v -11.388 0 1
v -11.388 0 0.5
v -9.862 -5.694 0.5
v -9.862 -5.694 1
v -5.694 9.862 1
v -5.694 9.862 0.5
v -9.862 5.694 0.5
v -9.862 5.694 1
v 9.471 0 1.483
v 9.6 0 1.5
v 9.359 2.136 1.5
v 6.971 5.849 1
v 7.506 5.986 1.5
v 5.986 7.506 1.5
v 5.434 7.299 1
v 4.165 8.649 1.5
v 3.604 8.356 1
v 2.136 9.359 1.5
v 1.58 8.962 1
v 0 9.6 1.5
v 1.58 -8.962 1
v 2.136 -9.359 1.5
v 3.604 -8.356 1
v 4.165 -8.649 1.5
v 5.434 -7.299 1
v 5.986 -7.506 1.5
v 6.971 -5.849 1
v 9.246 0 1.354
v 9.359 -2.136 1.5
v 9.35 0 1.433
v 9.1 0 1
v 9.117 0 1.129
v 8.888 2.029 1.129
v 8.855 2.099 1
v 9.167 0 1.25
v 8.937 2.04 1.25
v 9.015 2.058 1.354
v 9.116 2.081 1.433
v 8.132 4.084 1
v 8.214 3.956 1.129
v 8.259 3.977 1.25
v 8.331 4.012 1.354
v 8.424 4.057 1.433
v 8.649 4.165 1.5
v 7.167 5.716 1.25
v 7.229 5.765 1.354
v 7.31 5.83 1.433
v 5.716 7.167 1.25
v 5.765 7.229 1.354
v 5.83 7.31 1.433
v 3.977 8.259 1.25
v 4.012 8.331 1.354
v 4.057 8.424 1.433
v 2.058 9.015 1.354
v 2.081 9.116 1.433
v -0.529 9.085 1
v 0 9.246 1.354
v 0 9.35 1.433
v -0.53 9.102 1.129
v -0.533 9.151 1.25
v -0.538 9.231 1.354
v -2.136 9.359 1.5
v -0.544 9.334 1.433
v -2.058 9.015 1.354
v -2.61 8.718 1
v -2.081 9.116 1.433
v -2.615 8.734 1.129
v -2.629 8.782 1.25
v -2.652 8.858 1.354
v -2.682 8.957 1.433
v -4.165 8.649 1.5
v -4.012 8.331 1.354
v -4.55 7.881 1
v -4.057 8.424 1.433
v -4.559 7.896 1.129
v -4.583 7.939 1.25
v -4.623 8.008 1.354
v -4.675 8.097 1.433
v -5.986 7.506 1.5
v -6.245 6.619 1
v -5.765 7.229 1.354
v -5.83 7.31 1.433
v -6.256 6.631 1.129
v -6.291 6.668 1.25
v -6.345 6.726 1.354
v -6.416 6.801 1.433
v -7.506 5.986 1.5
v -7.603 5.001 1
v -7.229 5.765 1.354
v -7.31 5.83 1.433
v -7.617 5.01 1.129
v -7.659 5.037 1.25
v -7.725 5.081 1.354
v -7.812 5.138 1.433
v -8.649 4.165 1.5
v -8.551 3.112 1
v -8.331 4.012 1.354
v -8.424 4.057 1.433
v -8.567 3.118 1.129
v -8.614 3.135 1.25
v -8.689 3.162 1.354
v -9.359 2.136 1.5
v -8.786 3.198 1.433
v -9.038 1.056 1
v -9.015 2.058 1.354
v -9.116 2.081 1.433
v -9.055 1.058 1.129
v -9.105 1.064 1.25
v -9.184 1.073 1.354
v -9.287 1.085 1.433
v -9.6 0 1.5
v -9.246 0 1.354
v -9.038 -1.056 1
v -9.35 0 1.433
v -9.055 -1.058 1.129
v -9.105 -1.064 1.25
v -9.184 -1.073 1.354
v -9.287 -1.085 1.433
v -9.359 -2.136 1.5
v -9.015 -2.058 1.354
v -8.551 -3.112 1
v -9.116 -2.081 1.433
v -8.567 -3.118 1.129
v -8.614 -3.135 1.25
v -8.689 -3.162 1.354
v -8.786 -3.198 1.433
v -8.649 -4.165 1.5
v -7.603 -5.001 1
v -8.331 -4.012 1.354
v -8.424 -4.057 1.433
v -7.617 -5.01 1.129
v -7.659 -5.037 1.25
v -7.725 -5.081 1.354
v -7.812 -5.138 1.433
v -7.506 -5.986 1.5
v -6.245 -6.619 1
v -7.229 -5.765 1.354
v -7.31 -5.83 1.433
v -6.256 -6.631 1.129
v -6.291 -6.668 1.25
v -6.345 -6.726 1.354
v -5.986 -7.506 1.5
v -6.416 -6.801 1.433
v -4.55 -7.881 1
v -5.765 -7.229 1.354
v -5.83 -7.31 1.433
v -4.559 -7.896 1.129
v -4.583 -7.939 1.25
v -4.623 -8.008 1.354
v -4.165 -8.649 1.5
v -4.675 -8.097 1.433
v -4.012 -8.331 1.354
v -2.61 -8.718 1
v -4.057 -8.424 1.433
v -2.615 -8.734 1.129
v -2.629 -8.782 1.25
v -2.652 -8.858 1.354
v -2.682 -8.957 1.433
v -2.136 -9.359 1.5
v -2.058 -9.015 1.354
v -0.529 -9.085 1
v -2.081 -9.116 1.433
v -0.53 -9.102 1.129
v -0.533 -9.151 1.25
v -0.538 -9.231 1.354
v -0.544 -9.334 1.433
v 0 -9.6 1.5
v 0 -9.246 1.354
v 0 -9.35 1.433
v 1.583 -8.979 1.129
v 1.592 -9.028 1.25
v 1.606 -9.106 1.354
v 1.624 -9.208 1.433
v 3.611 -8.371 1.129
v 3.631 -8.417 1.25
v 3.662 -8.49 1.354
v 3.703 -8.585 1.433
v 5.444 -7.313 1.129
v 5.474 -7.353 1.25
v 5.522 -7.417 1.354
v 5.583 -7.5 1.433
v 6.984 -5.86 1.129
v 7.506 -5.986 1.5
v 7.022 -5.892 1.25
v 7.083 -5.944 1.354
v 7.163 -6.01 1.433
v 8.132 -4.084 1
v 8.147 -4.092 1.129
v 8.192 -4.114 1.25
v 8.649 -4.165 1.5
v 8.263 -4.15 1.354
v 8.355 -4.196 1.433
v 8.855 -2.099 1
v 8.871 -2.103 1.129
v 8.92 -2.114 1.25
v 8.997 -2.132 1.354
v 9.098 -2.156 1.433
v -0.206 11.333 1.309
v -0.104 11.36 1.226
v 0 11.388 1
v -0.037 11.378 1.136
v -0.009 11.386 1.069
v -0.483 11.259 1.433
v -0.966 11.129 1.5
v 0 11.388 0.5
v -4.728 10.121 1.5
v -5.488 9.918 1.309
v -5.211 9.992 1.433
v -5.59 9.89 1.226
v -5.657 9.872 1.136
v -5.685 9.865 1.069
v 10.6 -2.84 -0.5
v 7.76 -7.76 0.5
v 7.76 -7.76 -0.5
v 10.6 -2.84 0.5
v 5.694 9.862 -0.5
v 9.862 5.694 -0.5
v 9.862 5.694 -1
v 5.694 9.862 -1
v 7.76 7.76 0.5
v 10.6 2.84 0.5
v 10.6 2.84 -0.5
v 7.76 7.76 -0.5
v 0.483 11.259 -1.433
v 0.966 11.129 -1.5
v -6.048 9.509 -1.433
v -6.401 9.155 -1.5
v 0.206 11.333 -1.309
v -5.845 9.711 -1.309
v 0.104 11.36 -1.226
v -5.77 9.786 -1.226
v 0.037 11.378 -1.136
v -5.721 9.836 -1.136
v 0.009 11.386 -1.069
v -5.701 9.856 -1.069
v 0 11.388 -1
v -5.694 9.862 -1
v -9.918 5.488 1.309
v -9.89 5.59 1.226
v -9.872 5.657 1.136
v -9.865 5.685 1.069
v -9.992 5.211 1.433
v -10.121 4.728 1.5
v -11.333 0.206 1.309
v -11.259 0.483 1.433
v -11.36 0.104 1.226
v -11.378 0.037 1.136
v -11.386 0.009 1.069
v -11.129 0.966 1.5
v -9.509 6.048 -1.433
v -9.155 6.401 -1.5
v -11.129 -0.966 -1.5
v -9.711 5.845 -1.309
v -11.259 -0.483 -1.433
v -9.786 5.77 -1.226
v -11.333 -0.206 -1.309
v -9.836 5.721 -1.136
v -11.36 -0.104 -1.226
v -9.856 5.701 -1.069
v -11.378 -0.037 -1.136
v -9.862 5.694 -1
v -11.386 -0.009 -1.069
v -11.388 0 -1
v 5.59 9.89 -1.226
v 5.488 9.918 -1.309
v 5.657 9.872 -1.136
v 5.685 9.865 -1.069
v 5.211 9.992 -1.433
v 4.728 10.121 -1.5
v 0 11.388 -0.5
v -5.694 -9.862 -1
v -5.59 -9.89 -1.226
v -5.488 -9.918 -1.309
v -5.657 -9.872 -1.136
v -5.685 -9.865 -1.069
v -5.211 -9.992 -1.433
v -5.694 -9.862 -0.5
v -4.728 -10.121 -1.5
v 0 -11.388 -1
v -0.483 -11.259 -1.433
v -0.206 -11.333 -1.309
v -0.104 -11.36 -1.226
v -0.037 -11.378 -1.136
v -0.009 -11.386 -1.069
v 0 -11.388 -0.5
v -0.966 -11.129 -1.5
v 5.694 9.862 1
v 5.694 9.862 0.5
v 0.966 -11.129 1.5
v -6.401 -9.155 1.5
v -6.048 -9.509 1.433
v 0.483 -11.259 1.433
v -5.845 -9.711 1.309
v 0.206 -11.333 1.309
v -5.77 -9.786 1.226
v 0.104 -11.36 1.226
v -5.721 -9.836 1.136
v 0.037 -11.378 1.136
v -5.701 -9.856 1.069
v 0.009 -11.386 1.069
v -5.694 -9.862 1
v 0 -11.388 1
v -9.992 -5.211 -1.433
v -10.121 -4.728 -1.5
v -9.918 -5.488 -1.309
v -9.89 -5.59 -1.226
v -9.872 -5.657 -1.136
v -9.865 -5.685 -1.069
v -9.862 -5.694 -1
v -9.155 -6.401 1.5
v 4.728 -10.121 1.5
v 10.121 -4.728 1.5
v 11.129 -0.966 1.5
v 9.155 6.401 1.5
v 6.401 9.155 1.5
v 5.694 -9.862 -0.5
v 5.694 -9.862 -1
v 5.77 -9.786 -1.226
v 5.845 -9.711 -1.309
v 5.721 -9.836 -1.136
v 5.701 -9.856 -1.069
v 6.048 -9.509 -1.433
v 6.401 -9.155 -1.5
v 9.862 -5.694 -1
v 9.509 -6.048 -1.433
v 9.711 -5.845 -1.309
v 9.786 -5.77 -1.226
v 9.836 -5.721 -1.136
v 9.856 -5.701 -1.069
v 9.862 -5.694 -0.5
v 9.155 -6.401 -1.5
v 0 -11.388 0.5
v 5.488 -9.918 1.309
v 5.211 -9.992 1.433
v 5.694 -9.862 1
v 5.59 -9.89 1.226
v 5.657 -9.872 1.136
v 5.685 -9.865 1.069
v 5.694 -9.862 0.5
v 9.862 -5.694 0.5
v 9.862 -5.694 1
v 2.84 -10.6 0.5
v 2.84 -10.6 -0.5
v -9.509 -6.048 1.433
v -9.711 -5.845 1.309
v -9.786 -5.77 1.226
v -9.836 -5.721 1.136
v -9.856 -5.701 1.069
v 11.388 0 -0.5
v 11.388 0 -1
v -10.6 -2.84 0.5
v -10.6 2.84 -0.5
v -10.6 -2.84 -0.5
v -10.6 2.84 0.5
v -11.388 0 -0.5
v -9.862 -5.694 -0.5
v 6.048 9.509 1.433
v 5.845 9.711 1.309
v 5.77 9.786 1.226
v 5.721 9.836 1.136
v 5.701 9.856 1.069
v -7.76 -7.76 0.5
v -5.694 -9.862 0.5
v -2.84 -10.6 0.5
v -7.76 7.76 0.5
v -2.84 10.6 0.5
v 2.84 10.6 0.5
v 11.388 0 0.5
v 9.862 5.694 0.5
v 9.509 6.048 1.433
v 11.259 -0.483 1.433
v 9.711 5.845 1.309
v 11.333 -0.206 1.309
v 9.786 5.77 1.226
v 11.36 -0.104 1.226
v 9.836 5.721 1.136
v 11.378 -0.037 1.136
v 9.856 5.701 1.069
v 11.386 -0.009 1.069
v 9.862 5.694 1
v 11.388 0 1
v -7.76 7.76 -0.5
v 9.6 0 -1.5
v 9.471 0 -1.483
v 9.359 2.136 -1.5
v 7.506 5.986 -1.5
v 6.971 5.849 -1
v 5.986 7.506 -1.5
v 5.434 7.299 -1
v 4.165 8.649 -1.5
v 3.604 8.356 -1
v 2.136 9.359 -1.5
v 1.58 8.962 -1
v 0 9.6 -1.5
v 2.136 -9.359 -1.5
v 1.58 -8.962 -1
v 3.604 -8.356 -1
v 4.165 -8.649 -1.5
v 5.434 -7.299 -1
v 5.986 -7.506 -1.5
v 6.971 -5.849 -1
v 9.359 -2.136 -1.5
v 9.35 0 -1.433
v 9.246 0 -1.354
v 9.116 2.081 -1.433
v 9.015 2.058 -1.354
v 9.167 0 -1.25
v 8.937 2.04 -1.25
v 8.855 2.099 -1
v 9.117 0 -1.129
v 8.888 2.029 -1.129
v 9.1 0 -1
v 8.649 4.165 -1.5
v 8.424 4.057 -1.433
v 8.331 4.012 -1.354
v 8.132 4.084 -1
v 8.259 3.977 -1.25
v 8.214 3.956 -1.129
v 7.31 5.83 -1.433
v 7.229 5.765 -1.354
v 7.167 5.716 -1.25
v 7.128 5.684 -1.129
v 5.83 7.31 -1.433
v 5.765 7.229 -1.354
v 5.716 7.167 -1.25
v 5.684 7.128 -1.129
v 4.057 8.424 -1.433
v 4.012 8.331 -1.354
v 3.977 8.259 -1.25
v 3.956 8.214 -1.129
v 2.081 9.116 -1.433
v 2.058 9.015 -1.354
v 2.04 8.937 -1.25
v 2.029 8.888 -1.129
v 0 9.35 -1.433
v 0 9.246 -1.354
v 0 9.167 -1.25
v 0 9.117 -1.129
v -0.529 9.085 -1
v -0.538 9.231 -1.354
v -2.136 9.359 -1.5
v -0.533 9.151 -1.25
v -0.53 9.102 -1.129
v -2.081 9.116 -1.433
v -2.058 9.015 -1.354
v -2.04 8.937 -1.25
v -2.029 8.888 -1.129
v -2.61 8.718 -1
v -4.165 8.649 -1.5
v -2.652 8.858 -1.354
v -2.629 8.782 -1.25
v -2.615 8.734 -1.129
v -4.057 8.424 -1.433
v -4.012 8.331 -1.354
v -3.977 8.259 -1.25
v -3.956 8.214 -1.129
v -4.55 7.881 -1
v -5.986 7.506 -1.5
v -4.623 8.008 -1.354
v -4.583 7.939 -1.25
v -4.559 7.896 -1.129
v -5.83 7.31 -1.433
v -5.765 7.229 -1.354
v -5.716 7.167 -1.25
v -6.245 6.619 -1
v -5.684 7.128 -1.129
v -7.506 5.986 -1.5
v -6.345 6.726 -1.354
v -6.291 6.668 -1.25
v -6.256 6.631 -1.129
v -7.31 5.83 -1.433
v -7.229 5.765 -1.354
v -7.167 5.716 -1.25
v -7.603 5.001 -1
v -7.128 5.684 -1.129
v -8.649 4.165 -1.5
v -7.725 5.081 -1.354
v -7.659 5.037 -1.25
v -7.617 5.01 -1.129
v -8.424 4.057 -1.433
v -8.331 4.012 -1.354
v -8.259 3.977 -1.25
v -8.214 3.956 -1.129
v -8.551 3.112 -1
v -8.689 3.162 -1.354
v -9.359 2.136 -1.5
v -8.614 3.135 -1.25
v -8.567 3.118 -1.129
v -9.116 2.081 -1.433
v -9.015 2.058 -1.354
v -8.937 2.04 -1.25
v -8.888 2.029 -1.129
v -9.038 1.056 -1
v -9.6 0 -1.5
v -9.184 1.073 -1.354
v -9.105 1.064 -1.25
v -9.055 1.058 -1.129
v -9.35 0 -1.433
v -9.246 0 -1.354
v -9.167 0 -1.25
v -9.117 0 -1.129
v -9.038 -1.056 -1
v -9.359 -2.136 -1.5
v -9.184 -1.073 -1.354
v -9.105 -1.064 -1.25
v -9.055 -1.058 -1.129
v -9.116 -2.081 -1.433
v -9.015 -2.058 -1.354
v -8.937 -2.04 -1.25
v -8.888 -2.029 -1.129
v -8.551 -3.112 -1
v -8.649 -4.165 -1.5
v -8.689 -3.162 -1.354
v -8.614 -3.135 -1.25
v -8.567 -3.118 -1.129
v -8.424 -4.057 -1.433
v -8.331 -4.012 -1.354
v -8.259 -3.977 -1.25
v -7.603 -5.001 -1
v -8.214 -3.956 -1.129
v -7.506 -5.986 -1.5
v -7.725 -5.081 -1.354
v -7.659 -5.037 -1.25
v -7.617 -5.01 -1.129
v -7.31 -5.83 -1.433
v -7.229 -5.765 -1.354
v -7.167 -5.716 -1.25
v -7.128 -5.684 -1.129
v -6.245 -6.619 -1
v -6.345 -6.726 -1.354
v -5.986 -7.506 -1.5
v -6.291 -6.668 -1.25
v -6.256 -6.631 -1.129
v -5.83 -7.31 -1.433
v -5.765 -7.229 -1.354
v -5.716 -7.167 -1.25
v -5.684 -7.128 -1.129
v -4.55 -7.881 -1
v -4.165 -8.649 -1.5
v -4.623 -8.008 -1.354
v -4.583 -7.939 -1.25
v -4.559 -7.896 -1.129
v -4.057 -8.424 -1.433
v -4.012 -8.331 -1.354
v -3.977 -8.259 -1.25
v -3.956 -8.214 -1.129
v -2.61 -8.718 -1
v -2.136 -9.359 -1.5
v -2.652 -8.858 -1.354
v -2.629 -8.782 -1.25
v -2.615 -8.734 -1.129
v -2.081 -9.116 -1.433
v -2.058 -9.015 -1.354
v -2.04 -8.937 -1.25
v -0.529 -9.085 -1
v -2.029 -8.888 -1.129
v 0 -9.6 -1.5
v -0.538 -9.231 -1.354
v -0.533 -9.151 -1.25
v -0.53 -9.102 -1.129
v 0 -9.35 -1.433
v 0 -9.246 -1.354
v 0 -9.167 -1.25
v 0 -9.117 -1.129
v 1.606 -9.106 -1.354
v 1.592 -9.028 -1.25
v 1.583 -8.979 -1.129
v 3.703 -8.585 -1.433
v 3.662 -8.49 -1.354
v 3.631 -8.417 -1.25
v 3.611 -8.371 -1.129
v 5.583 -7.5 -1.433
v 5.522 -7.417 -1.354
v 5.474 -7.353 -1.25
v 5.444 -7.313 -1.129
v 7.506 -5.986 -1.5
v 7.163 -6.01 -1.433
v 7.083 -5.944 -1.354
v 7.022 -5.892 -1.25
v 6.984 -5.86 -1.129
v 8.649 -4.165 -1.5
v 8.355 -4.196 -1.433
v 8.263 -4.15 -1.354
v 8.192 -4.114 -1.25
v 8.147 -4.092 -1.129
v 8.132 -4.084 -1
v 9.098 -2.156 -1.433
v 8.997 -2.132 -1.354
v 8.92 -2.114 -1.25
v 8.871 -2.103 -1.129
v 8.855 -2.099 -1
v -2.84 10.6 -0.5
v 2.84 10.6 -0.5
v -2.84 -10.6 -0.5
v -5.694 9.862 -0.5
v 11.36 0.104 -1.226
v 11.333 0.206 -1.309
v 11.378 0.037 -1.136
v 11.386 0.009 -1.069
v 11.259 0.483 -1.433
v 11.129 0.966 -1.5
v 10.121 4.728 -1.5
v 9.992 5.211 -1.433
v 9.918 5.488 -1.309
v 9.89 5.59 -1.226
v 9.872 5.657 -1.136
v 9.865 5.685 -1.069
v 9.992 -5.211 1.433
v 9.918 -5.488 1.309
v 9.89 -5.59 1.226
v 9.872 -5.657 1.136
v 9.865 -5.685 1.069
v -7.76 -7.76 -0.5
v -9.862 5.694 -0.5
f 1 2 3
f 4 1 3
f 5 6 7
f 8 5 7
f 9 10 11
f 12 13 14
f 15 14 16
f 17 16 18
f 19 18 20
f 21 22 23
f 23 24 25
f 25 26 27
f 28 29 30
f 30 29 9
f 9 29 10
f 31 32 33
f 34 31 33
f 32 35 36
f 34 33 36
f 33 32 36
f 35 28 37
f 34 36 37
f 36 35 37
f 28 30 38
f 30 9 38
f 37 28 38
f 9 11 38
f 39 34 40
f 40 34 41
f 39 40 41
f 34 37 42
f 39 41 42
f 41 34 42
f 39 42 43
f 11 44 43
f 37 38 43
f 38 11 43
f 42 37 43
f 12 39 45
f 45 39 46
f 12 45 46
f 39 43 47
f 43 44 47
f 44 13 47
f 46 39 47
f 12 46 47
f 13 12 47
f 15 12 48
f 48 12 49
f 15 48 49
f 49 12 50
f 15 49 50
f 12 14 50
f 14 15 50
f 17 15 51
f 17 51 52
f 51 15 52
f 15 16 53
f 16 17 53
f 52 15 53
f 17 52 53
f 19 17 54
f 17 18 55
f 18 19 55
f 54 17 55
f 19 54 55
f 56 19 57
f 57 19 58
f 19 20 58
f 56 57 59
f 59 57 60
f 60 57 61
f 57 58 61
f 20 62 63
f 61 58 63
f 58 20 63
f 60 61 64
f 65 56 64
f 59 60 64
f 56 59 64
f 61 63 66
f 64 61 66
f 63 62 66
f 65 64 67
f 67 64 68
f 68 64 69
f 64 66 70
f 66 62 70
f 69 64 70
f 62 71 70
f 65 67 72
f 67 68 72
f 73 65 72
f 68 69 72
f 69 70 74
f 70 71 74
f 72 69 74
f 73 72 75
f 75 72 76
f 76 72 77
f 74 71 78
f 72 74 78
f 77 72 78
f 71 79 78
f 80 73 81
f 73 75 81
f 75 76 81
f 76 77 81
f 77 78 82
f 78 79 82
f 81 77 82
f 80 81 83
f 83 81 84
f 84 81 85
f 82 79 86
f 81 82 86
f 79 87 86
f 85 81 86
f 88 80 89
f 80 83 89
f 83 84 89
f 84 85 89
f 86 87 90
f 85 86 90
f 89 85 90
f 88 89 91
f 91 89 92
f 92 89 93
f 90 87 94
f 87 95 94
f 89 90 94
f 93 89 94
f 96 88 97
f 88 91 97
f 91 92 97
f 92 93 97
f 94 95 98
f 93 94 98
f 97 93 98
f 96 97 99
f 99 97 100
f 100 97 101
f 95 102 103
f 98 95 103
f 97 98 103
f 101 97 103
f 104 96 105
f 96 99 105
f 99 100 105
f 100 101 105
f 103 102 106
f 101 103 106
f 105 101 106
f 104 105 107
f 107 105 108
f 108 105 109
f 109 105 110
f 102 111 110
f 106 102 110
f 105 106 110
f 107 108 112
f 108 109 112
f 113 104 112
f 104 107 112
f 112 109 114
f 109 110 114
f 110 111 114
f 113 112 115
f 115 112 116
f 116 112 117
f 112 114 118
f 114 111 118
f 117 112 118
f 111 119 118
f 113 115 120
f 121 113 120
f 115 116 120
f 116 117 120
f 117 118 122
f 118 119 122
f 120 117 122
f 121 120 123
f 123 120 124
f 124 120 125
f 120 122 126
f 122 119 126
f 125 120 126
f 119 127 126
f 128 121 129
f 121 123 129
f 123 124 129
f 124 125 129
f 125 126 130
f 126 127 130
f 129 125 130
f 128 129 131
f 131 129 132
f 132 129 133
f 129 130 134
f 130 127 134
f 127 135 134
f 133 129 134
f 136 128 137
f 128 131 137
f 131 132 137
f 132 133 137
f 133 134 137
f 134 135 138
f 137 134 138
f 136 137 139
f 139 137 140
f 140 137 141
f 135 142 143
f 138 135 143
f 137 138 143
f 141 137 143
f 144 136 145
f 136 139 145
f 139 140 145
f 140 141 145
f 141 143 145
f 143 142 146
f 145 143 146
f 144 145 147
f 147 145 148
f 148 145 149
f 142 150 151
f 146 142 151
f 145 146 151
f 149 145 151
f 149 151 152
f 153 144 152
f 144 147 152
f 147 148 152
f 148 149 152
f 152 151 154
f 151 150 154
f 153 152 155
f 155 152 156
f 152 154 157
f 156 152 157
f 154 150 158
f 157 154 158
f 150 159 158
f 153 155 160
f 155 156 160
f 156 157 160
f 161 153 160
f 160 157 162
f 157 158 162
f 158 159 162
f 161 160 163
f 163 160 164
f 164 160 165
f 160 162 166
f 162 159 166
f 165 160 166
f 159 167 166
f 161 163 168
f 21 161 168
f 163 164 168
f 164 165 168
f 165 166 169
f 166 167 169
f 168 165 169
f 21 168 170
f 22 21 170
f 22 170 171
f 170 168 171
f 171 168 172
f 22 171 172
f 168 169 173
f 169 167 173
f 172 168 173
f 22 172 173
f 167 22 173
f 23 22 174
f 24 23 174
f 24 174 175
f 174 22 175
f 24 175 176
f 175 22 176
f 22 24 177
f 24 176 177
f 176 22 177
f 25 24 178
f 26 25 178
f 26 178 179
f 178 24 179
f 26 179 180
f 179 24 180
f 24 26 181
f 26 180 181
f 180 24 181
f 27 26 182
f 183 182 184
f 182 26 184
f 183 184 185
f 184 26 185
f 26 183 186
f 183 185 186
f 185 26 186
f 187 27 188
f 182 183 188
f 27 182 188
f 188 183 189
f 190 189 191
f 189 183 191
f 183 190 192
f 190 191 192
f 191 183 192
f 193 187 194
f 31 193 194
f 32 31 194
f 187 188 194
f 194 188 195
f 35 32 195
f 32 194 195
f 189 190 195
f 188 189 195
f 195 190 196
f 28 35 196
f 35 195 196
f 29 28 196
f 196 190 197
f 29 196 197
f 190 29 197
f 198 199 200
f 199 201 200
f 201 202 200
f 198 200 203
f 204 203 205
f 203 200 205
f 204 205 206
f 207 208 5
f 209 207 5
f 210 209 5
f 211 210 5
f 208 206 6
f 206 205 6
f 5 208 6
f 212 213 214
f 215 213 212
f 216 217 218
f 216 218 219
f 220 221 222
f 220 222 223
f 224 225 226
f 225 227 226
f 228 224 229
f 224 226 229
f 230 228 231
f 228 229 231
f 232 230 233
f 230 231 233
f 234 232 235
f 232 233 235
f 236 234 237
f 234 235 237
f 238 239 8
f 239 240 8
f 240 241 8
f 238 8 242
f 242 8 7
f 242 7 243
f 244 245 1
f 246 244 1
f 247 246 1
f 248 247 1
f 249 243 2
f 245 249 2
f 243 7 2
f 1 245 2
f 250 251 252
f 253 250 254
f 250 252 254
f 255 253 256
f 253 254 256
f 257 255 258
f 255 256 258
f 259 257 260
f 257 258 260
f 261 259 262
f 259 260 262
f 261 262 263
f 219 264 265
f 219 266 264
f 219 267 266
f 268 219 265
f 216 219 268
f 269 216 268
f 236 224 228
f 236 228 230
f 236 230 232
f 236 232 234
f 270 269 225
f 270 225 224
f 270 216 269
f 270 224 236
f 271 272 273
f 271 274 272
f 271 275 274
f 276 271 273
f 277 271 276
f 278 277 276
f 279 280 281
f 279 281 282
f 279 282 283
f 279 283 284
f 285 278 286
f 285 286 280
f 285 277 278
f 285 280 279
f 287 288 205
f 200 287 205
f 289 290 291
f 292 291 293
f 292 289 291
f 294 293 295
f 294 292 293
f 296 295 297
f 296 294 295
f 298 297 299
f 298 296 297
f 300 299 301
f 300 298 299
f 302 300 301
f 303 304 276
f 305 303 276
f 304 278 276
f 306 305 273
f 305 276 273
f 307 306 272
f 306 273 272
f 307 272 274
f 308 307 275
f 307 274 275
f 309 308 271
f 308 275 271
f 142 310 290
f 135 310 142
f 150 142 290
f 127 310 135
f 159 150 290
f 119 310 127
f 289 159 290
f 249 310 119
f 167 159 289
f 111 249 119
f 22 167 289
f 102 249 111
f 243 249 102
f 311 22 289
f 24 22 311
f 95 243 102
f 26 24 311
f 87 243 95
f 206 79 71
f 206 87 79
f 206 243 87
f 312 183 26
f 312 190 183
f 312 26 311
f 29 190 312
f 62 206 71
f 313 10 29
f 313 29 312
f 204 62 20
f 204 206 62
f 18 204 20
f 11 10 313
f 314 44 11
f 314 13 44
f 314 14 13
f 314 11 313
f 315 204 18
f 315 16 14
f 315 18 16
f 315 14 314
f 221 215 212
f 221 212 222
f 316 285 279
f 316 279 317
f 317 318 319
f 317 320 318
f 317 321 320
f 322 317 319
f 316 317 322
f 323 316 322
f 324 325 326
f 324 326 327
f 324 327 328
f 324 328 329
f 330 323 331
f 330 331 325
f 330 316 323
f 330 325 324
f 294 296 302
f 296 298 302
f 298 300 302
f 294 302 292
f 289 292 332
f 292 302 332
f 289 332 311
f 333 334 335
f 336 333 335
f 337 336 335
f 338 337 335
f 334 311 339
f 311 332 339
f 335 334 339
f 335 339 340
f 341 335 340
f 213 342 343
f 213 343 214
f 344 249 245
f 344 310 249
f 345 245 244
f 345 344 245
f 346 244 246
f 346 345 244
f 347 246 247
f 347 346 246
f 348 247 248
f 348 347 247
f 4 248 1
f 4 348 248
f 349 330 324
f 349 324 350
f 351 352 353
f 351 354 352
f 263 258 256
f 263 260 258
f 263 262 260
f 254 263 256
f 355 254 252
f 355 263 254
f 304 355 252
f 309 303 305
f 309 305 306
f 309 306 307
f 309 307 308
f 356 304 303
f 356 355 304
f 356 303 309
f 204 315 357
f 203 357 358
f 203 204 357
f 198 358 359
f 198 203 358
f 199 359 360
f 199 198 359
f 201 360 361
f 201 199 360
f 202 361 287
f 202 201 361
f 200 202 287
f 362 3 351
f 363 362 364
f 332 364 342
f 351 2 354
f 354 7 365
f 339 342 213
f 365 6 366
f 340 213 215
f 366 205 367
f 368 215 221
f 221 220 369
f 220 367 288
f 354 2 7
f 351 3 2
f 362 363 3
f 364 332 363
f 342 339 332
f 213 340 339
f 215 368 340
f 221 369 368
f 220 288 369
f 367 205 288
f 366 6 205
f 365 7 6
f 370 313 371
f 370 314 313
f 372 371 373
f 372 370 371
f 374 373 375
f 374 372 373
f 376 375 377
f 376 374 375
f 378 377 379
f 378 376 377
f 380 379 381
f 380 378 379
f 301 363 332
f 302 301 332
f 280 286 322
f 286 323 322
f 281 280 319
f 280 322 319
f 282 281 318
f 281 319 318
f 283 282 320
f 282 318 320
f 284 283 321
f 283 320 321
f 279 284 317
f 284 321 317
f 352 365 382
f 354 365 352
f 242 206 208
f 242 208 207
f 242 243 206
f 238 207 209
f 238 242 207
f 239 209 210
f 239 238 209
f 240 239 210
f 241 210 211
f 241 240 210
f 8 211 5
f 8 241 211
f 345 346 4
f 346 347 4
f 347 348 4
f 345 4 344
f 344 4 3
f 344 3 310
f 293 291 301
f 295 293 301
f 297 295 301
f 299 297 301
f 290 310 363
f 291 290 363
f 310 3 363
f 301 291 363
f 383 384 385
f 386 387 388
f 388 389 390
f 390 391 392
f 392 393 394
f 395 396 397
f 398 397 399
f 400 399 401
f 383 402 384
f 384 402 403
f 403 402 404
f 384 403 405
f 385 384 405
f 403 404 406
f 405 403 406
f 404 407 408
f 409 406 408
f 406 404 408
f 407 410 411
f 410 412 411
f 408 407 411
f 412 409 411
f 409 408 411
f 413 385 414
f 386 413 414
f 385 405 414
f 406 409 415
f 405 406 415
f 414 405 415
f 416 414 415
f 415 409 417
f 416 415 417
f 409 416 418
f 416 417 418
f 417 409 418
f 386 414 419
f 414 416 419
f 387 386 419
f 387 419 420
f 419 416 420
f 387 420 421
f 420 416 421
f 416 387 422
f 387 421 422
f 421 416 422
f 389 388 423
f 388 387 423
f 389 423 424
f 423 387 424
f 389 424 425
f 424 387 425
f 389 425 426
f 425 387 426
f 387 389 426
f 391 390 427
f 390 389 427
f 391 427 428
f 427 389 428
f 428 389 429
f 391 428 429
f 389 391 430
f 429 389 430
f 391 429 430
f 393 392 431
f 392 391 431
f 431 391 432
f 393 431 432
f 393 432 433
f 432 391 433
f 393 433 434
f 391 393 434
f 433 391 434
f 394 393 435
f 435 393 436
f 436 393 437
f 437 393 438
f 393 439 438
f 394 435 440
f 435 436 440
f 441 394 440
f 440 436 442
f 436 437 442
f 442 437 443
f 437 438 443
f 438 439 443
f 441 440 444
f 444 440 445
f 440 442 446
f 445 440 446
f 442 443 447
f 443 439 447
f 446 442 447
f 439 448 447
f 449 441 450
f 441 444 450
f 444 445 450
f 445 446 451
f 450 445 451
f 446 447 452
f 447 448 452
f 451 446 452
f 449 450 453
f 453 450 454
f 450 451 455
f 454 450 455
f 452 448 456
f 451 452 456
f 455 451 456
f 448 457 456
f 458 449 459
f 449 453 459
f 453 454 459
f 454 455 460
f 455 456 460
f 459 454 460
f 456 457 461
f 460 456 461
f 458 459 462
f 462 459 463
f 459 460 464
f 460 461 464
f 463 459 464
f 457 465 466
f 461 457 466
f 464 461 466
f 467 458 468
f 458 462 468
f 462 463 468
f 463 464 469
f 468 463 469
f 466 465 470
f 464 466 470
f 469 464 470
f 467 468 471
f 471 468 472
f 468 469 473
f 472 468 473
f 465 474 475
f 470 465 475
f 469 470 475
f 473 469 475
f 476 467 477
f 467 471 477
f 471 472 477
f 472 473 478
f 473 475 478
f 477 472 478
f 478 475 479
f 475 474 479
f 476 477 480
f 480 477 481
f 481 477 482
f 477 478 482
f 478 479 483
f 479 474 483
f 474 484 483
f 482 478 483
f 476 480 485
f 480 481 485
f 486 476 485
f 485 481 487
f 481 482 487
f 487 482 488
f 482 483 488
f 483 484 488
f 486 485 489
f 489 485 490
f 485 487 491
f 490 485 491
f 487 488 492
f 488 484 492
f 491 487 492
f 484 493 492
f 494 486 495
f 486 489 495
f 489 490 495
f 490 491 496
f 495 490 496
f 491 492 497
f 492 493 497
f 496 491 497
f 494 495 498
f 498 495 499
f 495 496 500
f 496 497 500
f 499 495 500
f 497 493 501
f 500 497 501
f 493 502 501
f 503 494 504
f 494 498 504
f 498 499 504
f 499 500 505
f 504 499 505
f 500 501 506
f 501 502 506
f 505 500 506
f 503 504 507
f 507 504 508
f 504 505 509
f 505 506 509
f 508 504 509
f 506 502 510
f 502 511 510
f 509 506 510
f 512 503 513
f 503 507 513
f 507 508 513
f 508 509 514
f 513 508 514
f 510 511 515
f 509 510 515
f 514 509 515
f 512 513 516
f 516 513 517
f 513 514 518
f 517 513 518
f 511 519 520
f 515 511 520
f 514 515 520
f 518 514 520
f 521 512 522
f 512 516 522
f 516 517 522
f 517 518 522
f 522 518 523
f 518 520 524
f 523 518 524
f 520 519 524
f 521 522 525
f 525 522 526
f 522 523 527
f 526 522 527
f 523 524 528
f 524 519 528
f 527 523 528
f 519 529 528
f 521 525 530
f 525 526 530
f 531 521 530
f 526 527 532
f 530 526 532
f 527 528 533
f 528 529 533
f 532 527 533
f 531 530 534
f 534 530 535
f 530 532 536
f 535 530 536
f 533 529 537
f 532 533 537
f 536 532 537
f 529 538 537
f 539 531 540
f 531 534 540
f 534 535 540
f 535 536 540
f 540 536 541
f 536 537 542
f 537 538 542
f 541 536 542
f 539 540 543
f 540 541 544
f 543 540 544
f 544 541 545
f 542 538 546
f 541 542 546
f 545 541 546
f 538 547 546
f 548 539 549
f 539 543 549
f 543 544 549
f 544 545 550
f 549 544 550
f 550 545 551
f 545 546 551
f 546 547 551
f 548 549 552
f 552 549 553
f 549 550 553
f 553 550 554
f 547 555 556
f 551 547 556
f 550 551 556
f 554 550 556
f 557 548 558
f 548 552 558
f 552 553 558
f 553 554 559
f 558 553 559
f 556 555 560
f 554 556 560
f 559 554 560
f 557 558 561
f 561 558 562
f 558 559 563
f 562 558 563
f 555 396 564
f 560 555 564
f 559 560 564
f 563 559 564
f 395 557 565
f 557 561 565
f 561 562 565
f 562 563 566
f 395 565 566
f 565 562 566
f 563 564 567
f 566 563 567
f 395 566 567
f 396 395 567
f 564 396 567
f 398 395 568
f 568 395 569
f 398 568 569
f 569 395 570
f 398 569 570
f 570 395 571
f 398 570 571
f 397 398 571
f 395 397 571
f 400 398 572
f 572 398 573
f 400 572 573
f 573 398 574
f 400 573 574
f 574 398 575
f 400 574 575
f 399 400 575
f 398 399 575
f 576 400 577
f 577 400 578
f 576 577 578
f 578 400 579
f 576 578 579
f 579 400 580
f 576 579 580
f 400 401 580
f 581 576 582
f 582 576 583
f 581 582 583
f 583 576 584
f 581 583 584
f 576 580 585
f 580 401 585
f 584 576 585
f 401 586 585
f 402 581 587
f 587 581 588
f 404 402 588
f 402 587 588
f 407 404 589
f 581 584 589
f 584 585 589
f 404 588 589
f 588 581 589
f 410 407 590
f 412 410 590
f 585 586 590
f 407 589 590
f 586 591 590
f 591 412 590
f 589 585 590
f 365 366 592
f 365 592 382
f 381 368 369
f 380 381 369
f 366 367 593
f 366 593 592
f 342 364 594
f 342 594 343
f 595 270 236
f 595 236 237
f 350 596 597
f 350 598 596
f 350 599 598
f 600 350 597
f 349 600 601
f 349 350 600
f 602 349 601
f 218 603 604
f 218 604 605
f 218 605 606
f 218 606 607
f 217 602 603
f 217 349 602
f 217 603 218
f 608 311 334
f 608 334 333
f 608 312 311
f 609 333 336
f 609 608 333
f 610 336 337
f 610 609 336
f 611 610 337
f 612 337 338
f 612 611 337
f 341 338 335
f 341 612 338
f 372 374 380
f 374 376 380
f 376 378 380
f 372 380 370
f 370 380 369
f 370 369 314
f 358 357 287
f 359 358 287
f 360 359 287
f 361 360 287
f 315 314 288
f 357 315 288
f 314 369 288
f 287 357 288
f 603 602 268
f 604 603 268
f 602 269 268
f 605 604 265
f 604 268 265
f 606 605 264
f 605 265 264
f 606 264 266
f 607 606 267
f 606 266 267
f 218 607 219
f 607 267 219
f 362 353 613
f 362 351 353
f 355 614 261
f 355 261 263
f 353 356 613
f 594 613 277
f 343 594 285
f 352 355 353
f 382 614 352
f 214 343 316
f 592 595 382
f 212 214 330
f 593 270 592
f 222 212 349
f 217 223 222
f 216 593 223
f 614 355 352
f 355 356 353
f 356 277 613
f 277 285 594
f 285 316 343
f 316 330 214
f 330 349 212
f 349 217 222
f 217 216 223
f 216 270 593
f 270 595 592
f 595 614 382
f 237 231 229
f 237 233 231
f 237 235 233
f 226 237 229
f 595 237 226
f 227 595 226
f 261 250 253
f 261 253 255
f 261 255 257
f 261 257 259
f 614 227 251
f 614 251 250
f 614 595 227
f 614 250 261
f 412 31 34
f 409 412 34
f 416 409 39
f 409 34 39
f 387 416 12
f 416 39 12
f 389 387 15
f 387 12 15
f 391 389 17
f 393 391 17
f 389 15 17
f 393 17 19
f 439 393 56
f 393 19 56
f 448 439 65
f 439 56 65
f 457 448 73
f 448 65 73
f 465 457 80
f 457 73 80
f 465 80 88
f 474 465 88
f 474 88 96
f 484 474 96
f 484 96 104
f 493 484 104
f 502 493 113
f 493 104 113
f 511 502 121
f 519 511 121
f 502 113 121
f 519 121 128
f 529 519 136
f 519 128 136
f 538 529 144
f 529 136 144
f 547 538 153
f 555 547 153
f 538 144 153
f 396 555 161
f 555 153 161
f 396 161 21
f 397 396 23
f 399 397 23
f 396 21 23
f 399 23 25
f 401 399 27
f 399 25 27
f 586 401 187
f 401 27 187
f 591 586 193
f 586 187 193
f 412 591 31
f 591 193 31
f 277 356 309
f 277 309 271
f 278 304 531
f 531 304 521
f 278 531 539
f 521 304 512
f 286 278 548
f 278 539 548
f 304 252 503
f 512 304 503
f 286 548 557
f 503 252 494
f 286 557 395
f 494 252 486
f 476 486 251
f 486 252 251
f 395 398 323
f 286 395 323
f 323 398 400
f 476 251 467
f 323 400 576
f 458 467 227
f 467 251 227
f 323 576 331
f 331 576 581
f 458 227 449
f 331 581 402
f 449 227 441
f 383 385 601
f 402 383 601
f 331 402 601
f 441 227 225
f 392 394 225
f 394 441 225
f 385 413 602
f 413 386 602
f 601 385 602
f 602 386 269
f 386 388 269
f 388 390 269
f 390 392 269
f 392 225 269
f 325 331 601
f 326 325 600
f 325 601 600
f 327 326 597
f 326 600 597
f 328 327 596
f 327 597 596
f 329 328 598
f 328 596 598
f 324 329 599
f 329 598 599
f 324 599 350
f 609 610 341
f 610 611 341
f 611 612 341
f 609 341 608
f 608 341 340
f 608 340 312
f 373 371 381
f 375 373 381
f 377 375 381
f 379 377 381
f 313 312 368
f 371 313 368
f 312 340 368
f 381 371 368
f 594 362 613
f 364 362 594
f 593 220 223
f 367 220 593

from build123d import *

# Parameters (mm, degrees)
F2_DEPTH = 0.5
F4_DEPTH = 1
F0_R     = 9.1
F6_DEPTH = 2.5
F7_R     = 0.5
F8_R     = 0.5


with BuildPart() as f2:
    # F1 (on Top) → F2 (new body, symmetric)
    with BuildSketch(Plane.XY):
        Polygon((-10.6, -2.8402614398), (-7.7597385602, -7.7597385602), (-2.8402614398, -10.6), (2.8402614398, -10.6), (7.7597385602, -7.7597385602), (10.6, -2.8402614398), (10.6, 2.8402614398), (7.7597385602, 7.7597385602), (2.8402614398, 10.6), (-2.8402614398, 10.6), (-7.7597385602, 7.7597385602), (-10.6, 2.8402614398), align=None)
    extrude(amount=F2_DEPTH, both=True)

    # F3 (on face) → F4 (join)
    with BuildSketch(Plane.XY.offset(0.5)):
        Polygon((-9.8623301938, 5.6940189923), (-11.3880379845, 0), (-9.8623301938, -5.6940189923), (-5.6940189923, -9.8623301938), (0, -11.3880379845), (5.6940189923, -9.8623301938), (9.8623301938, -5.6940189923), (11.3880379845, 0), (9.8623301938, 5.6940189923), (5.6940189923, 9.8623301938), (0, 11.3880379845), (-5.6940189923, 9.8623301938), align=None)
    extrude(amount=F4_DEPTH)

    # F5: F2 across plane


with BuildPart() as f2_1:
    add(f2.part)
    add(f2.part.mirror(Plane.XY))

    # F0 (on Top) → F6 (cut, symmetric)
    with BuildSketch(Plane.XY):
        Circle(F0_R)
    extrude(amount=F6_DEPTH, both=True, mode=Mode.SUBTRACT)

    # F7
    f7_edges = [f2_1.edges().sort_by_distance(p)[0] for p in [
        (-9.1, 0, -1.5),
        (9.1, 0, 0),
        (-9.1, 0, 1.5),
    ]]
    fillet(f7_edges, radius=F7_R)

    # F8
    f8_edges = [f2_1.edges().sort_by_distance(p)[0] for p in [
        (10.625184, -2.847009, -1.5),
        (7.778175, 7.778175, -1.5),
        (-2.847009, 10.625184, -1.5),
        (-10.625184, 2.847009, -1.5),
        (-7.778175, -7.778175, -1.5),
        (2.847009, -10.625184, -1.5),
        (-2.847009, -10.625184, 1.5),
        (7.778175, -7.778175, 1.5),
        (10.625184, 2.847009, 1.5),
        (2.847009, 10.625184, 1.5),
        (-7.778175, 7.778175, 1.5),
        (-10.625184, -2.847009, 1.5),
    ]]
    fillet(f8_edges, radius=F8_R)


solid = f2_1.part
